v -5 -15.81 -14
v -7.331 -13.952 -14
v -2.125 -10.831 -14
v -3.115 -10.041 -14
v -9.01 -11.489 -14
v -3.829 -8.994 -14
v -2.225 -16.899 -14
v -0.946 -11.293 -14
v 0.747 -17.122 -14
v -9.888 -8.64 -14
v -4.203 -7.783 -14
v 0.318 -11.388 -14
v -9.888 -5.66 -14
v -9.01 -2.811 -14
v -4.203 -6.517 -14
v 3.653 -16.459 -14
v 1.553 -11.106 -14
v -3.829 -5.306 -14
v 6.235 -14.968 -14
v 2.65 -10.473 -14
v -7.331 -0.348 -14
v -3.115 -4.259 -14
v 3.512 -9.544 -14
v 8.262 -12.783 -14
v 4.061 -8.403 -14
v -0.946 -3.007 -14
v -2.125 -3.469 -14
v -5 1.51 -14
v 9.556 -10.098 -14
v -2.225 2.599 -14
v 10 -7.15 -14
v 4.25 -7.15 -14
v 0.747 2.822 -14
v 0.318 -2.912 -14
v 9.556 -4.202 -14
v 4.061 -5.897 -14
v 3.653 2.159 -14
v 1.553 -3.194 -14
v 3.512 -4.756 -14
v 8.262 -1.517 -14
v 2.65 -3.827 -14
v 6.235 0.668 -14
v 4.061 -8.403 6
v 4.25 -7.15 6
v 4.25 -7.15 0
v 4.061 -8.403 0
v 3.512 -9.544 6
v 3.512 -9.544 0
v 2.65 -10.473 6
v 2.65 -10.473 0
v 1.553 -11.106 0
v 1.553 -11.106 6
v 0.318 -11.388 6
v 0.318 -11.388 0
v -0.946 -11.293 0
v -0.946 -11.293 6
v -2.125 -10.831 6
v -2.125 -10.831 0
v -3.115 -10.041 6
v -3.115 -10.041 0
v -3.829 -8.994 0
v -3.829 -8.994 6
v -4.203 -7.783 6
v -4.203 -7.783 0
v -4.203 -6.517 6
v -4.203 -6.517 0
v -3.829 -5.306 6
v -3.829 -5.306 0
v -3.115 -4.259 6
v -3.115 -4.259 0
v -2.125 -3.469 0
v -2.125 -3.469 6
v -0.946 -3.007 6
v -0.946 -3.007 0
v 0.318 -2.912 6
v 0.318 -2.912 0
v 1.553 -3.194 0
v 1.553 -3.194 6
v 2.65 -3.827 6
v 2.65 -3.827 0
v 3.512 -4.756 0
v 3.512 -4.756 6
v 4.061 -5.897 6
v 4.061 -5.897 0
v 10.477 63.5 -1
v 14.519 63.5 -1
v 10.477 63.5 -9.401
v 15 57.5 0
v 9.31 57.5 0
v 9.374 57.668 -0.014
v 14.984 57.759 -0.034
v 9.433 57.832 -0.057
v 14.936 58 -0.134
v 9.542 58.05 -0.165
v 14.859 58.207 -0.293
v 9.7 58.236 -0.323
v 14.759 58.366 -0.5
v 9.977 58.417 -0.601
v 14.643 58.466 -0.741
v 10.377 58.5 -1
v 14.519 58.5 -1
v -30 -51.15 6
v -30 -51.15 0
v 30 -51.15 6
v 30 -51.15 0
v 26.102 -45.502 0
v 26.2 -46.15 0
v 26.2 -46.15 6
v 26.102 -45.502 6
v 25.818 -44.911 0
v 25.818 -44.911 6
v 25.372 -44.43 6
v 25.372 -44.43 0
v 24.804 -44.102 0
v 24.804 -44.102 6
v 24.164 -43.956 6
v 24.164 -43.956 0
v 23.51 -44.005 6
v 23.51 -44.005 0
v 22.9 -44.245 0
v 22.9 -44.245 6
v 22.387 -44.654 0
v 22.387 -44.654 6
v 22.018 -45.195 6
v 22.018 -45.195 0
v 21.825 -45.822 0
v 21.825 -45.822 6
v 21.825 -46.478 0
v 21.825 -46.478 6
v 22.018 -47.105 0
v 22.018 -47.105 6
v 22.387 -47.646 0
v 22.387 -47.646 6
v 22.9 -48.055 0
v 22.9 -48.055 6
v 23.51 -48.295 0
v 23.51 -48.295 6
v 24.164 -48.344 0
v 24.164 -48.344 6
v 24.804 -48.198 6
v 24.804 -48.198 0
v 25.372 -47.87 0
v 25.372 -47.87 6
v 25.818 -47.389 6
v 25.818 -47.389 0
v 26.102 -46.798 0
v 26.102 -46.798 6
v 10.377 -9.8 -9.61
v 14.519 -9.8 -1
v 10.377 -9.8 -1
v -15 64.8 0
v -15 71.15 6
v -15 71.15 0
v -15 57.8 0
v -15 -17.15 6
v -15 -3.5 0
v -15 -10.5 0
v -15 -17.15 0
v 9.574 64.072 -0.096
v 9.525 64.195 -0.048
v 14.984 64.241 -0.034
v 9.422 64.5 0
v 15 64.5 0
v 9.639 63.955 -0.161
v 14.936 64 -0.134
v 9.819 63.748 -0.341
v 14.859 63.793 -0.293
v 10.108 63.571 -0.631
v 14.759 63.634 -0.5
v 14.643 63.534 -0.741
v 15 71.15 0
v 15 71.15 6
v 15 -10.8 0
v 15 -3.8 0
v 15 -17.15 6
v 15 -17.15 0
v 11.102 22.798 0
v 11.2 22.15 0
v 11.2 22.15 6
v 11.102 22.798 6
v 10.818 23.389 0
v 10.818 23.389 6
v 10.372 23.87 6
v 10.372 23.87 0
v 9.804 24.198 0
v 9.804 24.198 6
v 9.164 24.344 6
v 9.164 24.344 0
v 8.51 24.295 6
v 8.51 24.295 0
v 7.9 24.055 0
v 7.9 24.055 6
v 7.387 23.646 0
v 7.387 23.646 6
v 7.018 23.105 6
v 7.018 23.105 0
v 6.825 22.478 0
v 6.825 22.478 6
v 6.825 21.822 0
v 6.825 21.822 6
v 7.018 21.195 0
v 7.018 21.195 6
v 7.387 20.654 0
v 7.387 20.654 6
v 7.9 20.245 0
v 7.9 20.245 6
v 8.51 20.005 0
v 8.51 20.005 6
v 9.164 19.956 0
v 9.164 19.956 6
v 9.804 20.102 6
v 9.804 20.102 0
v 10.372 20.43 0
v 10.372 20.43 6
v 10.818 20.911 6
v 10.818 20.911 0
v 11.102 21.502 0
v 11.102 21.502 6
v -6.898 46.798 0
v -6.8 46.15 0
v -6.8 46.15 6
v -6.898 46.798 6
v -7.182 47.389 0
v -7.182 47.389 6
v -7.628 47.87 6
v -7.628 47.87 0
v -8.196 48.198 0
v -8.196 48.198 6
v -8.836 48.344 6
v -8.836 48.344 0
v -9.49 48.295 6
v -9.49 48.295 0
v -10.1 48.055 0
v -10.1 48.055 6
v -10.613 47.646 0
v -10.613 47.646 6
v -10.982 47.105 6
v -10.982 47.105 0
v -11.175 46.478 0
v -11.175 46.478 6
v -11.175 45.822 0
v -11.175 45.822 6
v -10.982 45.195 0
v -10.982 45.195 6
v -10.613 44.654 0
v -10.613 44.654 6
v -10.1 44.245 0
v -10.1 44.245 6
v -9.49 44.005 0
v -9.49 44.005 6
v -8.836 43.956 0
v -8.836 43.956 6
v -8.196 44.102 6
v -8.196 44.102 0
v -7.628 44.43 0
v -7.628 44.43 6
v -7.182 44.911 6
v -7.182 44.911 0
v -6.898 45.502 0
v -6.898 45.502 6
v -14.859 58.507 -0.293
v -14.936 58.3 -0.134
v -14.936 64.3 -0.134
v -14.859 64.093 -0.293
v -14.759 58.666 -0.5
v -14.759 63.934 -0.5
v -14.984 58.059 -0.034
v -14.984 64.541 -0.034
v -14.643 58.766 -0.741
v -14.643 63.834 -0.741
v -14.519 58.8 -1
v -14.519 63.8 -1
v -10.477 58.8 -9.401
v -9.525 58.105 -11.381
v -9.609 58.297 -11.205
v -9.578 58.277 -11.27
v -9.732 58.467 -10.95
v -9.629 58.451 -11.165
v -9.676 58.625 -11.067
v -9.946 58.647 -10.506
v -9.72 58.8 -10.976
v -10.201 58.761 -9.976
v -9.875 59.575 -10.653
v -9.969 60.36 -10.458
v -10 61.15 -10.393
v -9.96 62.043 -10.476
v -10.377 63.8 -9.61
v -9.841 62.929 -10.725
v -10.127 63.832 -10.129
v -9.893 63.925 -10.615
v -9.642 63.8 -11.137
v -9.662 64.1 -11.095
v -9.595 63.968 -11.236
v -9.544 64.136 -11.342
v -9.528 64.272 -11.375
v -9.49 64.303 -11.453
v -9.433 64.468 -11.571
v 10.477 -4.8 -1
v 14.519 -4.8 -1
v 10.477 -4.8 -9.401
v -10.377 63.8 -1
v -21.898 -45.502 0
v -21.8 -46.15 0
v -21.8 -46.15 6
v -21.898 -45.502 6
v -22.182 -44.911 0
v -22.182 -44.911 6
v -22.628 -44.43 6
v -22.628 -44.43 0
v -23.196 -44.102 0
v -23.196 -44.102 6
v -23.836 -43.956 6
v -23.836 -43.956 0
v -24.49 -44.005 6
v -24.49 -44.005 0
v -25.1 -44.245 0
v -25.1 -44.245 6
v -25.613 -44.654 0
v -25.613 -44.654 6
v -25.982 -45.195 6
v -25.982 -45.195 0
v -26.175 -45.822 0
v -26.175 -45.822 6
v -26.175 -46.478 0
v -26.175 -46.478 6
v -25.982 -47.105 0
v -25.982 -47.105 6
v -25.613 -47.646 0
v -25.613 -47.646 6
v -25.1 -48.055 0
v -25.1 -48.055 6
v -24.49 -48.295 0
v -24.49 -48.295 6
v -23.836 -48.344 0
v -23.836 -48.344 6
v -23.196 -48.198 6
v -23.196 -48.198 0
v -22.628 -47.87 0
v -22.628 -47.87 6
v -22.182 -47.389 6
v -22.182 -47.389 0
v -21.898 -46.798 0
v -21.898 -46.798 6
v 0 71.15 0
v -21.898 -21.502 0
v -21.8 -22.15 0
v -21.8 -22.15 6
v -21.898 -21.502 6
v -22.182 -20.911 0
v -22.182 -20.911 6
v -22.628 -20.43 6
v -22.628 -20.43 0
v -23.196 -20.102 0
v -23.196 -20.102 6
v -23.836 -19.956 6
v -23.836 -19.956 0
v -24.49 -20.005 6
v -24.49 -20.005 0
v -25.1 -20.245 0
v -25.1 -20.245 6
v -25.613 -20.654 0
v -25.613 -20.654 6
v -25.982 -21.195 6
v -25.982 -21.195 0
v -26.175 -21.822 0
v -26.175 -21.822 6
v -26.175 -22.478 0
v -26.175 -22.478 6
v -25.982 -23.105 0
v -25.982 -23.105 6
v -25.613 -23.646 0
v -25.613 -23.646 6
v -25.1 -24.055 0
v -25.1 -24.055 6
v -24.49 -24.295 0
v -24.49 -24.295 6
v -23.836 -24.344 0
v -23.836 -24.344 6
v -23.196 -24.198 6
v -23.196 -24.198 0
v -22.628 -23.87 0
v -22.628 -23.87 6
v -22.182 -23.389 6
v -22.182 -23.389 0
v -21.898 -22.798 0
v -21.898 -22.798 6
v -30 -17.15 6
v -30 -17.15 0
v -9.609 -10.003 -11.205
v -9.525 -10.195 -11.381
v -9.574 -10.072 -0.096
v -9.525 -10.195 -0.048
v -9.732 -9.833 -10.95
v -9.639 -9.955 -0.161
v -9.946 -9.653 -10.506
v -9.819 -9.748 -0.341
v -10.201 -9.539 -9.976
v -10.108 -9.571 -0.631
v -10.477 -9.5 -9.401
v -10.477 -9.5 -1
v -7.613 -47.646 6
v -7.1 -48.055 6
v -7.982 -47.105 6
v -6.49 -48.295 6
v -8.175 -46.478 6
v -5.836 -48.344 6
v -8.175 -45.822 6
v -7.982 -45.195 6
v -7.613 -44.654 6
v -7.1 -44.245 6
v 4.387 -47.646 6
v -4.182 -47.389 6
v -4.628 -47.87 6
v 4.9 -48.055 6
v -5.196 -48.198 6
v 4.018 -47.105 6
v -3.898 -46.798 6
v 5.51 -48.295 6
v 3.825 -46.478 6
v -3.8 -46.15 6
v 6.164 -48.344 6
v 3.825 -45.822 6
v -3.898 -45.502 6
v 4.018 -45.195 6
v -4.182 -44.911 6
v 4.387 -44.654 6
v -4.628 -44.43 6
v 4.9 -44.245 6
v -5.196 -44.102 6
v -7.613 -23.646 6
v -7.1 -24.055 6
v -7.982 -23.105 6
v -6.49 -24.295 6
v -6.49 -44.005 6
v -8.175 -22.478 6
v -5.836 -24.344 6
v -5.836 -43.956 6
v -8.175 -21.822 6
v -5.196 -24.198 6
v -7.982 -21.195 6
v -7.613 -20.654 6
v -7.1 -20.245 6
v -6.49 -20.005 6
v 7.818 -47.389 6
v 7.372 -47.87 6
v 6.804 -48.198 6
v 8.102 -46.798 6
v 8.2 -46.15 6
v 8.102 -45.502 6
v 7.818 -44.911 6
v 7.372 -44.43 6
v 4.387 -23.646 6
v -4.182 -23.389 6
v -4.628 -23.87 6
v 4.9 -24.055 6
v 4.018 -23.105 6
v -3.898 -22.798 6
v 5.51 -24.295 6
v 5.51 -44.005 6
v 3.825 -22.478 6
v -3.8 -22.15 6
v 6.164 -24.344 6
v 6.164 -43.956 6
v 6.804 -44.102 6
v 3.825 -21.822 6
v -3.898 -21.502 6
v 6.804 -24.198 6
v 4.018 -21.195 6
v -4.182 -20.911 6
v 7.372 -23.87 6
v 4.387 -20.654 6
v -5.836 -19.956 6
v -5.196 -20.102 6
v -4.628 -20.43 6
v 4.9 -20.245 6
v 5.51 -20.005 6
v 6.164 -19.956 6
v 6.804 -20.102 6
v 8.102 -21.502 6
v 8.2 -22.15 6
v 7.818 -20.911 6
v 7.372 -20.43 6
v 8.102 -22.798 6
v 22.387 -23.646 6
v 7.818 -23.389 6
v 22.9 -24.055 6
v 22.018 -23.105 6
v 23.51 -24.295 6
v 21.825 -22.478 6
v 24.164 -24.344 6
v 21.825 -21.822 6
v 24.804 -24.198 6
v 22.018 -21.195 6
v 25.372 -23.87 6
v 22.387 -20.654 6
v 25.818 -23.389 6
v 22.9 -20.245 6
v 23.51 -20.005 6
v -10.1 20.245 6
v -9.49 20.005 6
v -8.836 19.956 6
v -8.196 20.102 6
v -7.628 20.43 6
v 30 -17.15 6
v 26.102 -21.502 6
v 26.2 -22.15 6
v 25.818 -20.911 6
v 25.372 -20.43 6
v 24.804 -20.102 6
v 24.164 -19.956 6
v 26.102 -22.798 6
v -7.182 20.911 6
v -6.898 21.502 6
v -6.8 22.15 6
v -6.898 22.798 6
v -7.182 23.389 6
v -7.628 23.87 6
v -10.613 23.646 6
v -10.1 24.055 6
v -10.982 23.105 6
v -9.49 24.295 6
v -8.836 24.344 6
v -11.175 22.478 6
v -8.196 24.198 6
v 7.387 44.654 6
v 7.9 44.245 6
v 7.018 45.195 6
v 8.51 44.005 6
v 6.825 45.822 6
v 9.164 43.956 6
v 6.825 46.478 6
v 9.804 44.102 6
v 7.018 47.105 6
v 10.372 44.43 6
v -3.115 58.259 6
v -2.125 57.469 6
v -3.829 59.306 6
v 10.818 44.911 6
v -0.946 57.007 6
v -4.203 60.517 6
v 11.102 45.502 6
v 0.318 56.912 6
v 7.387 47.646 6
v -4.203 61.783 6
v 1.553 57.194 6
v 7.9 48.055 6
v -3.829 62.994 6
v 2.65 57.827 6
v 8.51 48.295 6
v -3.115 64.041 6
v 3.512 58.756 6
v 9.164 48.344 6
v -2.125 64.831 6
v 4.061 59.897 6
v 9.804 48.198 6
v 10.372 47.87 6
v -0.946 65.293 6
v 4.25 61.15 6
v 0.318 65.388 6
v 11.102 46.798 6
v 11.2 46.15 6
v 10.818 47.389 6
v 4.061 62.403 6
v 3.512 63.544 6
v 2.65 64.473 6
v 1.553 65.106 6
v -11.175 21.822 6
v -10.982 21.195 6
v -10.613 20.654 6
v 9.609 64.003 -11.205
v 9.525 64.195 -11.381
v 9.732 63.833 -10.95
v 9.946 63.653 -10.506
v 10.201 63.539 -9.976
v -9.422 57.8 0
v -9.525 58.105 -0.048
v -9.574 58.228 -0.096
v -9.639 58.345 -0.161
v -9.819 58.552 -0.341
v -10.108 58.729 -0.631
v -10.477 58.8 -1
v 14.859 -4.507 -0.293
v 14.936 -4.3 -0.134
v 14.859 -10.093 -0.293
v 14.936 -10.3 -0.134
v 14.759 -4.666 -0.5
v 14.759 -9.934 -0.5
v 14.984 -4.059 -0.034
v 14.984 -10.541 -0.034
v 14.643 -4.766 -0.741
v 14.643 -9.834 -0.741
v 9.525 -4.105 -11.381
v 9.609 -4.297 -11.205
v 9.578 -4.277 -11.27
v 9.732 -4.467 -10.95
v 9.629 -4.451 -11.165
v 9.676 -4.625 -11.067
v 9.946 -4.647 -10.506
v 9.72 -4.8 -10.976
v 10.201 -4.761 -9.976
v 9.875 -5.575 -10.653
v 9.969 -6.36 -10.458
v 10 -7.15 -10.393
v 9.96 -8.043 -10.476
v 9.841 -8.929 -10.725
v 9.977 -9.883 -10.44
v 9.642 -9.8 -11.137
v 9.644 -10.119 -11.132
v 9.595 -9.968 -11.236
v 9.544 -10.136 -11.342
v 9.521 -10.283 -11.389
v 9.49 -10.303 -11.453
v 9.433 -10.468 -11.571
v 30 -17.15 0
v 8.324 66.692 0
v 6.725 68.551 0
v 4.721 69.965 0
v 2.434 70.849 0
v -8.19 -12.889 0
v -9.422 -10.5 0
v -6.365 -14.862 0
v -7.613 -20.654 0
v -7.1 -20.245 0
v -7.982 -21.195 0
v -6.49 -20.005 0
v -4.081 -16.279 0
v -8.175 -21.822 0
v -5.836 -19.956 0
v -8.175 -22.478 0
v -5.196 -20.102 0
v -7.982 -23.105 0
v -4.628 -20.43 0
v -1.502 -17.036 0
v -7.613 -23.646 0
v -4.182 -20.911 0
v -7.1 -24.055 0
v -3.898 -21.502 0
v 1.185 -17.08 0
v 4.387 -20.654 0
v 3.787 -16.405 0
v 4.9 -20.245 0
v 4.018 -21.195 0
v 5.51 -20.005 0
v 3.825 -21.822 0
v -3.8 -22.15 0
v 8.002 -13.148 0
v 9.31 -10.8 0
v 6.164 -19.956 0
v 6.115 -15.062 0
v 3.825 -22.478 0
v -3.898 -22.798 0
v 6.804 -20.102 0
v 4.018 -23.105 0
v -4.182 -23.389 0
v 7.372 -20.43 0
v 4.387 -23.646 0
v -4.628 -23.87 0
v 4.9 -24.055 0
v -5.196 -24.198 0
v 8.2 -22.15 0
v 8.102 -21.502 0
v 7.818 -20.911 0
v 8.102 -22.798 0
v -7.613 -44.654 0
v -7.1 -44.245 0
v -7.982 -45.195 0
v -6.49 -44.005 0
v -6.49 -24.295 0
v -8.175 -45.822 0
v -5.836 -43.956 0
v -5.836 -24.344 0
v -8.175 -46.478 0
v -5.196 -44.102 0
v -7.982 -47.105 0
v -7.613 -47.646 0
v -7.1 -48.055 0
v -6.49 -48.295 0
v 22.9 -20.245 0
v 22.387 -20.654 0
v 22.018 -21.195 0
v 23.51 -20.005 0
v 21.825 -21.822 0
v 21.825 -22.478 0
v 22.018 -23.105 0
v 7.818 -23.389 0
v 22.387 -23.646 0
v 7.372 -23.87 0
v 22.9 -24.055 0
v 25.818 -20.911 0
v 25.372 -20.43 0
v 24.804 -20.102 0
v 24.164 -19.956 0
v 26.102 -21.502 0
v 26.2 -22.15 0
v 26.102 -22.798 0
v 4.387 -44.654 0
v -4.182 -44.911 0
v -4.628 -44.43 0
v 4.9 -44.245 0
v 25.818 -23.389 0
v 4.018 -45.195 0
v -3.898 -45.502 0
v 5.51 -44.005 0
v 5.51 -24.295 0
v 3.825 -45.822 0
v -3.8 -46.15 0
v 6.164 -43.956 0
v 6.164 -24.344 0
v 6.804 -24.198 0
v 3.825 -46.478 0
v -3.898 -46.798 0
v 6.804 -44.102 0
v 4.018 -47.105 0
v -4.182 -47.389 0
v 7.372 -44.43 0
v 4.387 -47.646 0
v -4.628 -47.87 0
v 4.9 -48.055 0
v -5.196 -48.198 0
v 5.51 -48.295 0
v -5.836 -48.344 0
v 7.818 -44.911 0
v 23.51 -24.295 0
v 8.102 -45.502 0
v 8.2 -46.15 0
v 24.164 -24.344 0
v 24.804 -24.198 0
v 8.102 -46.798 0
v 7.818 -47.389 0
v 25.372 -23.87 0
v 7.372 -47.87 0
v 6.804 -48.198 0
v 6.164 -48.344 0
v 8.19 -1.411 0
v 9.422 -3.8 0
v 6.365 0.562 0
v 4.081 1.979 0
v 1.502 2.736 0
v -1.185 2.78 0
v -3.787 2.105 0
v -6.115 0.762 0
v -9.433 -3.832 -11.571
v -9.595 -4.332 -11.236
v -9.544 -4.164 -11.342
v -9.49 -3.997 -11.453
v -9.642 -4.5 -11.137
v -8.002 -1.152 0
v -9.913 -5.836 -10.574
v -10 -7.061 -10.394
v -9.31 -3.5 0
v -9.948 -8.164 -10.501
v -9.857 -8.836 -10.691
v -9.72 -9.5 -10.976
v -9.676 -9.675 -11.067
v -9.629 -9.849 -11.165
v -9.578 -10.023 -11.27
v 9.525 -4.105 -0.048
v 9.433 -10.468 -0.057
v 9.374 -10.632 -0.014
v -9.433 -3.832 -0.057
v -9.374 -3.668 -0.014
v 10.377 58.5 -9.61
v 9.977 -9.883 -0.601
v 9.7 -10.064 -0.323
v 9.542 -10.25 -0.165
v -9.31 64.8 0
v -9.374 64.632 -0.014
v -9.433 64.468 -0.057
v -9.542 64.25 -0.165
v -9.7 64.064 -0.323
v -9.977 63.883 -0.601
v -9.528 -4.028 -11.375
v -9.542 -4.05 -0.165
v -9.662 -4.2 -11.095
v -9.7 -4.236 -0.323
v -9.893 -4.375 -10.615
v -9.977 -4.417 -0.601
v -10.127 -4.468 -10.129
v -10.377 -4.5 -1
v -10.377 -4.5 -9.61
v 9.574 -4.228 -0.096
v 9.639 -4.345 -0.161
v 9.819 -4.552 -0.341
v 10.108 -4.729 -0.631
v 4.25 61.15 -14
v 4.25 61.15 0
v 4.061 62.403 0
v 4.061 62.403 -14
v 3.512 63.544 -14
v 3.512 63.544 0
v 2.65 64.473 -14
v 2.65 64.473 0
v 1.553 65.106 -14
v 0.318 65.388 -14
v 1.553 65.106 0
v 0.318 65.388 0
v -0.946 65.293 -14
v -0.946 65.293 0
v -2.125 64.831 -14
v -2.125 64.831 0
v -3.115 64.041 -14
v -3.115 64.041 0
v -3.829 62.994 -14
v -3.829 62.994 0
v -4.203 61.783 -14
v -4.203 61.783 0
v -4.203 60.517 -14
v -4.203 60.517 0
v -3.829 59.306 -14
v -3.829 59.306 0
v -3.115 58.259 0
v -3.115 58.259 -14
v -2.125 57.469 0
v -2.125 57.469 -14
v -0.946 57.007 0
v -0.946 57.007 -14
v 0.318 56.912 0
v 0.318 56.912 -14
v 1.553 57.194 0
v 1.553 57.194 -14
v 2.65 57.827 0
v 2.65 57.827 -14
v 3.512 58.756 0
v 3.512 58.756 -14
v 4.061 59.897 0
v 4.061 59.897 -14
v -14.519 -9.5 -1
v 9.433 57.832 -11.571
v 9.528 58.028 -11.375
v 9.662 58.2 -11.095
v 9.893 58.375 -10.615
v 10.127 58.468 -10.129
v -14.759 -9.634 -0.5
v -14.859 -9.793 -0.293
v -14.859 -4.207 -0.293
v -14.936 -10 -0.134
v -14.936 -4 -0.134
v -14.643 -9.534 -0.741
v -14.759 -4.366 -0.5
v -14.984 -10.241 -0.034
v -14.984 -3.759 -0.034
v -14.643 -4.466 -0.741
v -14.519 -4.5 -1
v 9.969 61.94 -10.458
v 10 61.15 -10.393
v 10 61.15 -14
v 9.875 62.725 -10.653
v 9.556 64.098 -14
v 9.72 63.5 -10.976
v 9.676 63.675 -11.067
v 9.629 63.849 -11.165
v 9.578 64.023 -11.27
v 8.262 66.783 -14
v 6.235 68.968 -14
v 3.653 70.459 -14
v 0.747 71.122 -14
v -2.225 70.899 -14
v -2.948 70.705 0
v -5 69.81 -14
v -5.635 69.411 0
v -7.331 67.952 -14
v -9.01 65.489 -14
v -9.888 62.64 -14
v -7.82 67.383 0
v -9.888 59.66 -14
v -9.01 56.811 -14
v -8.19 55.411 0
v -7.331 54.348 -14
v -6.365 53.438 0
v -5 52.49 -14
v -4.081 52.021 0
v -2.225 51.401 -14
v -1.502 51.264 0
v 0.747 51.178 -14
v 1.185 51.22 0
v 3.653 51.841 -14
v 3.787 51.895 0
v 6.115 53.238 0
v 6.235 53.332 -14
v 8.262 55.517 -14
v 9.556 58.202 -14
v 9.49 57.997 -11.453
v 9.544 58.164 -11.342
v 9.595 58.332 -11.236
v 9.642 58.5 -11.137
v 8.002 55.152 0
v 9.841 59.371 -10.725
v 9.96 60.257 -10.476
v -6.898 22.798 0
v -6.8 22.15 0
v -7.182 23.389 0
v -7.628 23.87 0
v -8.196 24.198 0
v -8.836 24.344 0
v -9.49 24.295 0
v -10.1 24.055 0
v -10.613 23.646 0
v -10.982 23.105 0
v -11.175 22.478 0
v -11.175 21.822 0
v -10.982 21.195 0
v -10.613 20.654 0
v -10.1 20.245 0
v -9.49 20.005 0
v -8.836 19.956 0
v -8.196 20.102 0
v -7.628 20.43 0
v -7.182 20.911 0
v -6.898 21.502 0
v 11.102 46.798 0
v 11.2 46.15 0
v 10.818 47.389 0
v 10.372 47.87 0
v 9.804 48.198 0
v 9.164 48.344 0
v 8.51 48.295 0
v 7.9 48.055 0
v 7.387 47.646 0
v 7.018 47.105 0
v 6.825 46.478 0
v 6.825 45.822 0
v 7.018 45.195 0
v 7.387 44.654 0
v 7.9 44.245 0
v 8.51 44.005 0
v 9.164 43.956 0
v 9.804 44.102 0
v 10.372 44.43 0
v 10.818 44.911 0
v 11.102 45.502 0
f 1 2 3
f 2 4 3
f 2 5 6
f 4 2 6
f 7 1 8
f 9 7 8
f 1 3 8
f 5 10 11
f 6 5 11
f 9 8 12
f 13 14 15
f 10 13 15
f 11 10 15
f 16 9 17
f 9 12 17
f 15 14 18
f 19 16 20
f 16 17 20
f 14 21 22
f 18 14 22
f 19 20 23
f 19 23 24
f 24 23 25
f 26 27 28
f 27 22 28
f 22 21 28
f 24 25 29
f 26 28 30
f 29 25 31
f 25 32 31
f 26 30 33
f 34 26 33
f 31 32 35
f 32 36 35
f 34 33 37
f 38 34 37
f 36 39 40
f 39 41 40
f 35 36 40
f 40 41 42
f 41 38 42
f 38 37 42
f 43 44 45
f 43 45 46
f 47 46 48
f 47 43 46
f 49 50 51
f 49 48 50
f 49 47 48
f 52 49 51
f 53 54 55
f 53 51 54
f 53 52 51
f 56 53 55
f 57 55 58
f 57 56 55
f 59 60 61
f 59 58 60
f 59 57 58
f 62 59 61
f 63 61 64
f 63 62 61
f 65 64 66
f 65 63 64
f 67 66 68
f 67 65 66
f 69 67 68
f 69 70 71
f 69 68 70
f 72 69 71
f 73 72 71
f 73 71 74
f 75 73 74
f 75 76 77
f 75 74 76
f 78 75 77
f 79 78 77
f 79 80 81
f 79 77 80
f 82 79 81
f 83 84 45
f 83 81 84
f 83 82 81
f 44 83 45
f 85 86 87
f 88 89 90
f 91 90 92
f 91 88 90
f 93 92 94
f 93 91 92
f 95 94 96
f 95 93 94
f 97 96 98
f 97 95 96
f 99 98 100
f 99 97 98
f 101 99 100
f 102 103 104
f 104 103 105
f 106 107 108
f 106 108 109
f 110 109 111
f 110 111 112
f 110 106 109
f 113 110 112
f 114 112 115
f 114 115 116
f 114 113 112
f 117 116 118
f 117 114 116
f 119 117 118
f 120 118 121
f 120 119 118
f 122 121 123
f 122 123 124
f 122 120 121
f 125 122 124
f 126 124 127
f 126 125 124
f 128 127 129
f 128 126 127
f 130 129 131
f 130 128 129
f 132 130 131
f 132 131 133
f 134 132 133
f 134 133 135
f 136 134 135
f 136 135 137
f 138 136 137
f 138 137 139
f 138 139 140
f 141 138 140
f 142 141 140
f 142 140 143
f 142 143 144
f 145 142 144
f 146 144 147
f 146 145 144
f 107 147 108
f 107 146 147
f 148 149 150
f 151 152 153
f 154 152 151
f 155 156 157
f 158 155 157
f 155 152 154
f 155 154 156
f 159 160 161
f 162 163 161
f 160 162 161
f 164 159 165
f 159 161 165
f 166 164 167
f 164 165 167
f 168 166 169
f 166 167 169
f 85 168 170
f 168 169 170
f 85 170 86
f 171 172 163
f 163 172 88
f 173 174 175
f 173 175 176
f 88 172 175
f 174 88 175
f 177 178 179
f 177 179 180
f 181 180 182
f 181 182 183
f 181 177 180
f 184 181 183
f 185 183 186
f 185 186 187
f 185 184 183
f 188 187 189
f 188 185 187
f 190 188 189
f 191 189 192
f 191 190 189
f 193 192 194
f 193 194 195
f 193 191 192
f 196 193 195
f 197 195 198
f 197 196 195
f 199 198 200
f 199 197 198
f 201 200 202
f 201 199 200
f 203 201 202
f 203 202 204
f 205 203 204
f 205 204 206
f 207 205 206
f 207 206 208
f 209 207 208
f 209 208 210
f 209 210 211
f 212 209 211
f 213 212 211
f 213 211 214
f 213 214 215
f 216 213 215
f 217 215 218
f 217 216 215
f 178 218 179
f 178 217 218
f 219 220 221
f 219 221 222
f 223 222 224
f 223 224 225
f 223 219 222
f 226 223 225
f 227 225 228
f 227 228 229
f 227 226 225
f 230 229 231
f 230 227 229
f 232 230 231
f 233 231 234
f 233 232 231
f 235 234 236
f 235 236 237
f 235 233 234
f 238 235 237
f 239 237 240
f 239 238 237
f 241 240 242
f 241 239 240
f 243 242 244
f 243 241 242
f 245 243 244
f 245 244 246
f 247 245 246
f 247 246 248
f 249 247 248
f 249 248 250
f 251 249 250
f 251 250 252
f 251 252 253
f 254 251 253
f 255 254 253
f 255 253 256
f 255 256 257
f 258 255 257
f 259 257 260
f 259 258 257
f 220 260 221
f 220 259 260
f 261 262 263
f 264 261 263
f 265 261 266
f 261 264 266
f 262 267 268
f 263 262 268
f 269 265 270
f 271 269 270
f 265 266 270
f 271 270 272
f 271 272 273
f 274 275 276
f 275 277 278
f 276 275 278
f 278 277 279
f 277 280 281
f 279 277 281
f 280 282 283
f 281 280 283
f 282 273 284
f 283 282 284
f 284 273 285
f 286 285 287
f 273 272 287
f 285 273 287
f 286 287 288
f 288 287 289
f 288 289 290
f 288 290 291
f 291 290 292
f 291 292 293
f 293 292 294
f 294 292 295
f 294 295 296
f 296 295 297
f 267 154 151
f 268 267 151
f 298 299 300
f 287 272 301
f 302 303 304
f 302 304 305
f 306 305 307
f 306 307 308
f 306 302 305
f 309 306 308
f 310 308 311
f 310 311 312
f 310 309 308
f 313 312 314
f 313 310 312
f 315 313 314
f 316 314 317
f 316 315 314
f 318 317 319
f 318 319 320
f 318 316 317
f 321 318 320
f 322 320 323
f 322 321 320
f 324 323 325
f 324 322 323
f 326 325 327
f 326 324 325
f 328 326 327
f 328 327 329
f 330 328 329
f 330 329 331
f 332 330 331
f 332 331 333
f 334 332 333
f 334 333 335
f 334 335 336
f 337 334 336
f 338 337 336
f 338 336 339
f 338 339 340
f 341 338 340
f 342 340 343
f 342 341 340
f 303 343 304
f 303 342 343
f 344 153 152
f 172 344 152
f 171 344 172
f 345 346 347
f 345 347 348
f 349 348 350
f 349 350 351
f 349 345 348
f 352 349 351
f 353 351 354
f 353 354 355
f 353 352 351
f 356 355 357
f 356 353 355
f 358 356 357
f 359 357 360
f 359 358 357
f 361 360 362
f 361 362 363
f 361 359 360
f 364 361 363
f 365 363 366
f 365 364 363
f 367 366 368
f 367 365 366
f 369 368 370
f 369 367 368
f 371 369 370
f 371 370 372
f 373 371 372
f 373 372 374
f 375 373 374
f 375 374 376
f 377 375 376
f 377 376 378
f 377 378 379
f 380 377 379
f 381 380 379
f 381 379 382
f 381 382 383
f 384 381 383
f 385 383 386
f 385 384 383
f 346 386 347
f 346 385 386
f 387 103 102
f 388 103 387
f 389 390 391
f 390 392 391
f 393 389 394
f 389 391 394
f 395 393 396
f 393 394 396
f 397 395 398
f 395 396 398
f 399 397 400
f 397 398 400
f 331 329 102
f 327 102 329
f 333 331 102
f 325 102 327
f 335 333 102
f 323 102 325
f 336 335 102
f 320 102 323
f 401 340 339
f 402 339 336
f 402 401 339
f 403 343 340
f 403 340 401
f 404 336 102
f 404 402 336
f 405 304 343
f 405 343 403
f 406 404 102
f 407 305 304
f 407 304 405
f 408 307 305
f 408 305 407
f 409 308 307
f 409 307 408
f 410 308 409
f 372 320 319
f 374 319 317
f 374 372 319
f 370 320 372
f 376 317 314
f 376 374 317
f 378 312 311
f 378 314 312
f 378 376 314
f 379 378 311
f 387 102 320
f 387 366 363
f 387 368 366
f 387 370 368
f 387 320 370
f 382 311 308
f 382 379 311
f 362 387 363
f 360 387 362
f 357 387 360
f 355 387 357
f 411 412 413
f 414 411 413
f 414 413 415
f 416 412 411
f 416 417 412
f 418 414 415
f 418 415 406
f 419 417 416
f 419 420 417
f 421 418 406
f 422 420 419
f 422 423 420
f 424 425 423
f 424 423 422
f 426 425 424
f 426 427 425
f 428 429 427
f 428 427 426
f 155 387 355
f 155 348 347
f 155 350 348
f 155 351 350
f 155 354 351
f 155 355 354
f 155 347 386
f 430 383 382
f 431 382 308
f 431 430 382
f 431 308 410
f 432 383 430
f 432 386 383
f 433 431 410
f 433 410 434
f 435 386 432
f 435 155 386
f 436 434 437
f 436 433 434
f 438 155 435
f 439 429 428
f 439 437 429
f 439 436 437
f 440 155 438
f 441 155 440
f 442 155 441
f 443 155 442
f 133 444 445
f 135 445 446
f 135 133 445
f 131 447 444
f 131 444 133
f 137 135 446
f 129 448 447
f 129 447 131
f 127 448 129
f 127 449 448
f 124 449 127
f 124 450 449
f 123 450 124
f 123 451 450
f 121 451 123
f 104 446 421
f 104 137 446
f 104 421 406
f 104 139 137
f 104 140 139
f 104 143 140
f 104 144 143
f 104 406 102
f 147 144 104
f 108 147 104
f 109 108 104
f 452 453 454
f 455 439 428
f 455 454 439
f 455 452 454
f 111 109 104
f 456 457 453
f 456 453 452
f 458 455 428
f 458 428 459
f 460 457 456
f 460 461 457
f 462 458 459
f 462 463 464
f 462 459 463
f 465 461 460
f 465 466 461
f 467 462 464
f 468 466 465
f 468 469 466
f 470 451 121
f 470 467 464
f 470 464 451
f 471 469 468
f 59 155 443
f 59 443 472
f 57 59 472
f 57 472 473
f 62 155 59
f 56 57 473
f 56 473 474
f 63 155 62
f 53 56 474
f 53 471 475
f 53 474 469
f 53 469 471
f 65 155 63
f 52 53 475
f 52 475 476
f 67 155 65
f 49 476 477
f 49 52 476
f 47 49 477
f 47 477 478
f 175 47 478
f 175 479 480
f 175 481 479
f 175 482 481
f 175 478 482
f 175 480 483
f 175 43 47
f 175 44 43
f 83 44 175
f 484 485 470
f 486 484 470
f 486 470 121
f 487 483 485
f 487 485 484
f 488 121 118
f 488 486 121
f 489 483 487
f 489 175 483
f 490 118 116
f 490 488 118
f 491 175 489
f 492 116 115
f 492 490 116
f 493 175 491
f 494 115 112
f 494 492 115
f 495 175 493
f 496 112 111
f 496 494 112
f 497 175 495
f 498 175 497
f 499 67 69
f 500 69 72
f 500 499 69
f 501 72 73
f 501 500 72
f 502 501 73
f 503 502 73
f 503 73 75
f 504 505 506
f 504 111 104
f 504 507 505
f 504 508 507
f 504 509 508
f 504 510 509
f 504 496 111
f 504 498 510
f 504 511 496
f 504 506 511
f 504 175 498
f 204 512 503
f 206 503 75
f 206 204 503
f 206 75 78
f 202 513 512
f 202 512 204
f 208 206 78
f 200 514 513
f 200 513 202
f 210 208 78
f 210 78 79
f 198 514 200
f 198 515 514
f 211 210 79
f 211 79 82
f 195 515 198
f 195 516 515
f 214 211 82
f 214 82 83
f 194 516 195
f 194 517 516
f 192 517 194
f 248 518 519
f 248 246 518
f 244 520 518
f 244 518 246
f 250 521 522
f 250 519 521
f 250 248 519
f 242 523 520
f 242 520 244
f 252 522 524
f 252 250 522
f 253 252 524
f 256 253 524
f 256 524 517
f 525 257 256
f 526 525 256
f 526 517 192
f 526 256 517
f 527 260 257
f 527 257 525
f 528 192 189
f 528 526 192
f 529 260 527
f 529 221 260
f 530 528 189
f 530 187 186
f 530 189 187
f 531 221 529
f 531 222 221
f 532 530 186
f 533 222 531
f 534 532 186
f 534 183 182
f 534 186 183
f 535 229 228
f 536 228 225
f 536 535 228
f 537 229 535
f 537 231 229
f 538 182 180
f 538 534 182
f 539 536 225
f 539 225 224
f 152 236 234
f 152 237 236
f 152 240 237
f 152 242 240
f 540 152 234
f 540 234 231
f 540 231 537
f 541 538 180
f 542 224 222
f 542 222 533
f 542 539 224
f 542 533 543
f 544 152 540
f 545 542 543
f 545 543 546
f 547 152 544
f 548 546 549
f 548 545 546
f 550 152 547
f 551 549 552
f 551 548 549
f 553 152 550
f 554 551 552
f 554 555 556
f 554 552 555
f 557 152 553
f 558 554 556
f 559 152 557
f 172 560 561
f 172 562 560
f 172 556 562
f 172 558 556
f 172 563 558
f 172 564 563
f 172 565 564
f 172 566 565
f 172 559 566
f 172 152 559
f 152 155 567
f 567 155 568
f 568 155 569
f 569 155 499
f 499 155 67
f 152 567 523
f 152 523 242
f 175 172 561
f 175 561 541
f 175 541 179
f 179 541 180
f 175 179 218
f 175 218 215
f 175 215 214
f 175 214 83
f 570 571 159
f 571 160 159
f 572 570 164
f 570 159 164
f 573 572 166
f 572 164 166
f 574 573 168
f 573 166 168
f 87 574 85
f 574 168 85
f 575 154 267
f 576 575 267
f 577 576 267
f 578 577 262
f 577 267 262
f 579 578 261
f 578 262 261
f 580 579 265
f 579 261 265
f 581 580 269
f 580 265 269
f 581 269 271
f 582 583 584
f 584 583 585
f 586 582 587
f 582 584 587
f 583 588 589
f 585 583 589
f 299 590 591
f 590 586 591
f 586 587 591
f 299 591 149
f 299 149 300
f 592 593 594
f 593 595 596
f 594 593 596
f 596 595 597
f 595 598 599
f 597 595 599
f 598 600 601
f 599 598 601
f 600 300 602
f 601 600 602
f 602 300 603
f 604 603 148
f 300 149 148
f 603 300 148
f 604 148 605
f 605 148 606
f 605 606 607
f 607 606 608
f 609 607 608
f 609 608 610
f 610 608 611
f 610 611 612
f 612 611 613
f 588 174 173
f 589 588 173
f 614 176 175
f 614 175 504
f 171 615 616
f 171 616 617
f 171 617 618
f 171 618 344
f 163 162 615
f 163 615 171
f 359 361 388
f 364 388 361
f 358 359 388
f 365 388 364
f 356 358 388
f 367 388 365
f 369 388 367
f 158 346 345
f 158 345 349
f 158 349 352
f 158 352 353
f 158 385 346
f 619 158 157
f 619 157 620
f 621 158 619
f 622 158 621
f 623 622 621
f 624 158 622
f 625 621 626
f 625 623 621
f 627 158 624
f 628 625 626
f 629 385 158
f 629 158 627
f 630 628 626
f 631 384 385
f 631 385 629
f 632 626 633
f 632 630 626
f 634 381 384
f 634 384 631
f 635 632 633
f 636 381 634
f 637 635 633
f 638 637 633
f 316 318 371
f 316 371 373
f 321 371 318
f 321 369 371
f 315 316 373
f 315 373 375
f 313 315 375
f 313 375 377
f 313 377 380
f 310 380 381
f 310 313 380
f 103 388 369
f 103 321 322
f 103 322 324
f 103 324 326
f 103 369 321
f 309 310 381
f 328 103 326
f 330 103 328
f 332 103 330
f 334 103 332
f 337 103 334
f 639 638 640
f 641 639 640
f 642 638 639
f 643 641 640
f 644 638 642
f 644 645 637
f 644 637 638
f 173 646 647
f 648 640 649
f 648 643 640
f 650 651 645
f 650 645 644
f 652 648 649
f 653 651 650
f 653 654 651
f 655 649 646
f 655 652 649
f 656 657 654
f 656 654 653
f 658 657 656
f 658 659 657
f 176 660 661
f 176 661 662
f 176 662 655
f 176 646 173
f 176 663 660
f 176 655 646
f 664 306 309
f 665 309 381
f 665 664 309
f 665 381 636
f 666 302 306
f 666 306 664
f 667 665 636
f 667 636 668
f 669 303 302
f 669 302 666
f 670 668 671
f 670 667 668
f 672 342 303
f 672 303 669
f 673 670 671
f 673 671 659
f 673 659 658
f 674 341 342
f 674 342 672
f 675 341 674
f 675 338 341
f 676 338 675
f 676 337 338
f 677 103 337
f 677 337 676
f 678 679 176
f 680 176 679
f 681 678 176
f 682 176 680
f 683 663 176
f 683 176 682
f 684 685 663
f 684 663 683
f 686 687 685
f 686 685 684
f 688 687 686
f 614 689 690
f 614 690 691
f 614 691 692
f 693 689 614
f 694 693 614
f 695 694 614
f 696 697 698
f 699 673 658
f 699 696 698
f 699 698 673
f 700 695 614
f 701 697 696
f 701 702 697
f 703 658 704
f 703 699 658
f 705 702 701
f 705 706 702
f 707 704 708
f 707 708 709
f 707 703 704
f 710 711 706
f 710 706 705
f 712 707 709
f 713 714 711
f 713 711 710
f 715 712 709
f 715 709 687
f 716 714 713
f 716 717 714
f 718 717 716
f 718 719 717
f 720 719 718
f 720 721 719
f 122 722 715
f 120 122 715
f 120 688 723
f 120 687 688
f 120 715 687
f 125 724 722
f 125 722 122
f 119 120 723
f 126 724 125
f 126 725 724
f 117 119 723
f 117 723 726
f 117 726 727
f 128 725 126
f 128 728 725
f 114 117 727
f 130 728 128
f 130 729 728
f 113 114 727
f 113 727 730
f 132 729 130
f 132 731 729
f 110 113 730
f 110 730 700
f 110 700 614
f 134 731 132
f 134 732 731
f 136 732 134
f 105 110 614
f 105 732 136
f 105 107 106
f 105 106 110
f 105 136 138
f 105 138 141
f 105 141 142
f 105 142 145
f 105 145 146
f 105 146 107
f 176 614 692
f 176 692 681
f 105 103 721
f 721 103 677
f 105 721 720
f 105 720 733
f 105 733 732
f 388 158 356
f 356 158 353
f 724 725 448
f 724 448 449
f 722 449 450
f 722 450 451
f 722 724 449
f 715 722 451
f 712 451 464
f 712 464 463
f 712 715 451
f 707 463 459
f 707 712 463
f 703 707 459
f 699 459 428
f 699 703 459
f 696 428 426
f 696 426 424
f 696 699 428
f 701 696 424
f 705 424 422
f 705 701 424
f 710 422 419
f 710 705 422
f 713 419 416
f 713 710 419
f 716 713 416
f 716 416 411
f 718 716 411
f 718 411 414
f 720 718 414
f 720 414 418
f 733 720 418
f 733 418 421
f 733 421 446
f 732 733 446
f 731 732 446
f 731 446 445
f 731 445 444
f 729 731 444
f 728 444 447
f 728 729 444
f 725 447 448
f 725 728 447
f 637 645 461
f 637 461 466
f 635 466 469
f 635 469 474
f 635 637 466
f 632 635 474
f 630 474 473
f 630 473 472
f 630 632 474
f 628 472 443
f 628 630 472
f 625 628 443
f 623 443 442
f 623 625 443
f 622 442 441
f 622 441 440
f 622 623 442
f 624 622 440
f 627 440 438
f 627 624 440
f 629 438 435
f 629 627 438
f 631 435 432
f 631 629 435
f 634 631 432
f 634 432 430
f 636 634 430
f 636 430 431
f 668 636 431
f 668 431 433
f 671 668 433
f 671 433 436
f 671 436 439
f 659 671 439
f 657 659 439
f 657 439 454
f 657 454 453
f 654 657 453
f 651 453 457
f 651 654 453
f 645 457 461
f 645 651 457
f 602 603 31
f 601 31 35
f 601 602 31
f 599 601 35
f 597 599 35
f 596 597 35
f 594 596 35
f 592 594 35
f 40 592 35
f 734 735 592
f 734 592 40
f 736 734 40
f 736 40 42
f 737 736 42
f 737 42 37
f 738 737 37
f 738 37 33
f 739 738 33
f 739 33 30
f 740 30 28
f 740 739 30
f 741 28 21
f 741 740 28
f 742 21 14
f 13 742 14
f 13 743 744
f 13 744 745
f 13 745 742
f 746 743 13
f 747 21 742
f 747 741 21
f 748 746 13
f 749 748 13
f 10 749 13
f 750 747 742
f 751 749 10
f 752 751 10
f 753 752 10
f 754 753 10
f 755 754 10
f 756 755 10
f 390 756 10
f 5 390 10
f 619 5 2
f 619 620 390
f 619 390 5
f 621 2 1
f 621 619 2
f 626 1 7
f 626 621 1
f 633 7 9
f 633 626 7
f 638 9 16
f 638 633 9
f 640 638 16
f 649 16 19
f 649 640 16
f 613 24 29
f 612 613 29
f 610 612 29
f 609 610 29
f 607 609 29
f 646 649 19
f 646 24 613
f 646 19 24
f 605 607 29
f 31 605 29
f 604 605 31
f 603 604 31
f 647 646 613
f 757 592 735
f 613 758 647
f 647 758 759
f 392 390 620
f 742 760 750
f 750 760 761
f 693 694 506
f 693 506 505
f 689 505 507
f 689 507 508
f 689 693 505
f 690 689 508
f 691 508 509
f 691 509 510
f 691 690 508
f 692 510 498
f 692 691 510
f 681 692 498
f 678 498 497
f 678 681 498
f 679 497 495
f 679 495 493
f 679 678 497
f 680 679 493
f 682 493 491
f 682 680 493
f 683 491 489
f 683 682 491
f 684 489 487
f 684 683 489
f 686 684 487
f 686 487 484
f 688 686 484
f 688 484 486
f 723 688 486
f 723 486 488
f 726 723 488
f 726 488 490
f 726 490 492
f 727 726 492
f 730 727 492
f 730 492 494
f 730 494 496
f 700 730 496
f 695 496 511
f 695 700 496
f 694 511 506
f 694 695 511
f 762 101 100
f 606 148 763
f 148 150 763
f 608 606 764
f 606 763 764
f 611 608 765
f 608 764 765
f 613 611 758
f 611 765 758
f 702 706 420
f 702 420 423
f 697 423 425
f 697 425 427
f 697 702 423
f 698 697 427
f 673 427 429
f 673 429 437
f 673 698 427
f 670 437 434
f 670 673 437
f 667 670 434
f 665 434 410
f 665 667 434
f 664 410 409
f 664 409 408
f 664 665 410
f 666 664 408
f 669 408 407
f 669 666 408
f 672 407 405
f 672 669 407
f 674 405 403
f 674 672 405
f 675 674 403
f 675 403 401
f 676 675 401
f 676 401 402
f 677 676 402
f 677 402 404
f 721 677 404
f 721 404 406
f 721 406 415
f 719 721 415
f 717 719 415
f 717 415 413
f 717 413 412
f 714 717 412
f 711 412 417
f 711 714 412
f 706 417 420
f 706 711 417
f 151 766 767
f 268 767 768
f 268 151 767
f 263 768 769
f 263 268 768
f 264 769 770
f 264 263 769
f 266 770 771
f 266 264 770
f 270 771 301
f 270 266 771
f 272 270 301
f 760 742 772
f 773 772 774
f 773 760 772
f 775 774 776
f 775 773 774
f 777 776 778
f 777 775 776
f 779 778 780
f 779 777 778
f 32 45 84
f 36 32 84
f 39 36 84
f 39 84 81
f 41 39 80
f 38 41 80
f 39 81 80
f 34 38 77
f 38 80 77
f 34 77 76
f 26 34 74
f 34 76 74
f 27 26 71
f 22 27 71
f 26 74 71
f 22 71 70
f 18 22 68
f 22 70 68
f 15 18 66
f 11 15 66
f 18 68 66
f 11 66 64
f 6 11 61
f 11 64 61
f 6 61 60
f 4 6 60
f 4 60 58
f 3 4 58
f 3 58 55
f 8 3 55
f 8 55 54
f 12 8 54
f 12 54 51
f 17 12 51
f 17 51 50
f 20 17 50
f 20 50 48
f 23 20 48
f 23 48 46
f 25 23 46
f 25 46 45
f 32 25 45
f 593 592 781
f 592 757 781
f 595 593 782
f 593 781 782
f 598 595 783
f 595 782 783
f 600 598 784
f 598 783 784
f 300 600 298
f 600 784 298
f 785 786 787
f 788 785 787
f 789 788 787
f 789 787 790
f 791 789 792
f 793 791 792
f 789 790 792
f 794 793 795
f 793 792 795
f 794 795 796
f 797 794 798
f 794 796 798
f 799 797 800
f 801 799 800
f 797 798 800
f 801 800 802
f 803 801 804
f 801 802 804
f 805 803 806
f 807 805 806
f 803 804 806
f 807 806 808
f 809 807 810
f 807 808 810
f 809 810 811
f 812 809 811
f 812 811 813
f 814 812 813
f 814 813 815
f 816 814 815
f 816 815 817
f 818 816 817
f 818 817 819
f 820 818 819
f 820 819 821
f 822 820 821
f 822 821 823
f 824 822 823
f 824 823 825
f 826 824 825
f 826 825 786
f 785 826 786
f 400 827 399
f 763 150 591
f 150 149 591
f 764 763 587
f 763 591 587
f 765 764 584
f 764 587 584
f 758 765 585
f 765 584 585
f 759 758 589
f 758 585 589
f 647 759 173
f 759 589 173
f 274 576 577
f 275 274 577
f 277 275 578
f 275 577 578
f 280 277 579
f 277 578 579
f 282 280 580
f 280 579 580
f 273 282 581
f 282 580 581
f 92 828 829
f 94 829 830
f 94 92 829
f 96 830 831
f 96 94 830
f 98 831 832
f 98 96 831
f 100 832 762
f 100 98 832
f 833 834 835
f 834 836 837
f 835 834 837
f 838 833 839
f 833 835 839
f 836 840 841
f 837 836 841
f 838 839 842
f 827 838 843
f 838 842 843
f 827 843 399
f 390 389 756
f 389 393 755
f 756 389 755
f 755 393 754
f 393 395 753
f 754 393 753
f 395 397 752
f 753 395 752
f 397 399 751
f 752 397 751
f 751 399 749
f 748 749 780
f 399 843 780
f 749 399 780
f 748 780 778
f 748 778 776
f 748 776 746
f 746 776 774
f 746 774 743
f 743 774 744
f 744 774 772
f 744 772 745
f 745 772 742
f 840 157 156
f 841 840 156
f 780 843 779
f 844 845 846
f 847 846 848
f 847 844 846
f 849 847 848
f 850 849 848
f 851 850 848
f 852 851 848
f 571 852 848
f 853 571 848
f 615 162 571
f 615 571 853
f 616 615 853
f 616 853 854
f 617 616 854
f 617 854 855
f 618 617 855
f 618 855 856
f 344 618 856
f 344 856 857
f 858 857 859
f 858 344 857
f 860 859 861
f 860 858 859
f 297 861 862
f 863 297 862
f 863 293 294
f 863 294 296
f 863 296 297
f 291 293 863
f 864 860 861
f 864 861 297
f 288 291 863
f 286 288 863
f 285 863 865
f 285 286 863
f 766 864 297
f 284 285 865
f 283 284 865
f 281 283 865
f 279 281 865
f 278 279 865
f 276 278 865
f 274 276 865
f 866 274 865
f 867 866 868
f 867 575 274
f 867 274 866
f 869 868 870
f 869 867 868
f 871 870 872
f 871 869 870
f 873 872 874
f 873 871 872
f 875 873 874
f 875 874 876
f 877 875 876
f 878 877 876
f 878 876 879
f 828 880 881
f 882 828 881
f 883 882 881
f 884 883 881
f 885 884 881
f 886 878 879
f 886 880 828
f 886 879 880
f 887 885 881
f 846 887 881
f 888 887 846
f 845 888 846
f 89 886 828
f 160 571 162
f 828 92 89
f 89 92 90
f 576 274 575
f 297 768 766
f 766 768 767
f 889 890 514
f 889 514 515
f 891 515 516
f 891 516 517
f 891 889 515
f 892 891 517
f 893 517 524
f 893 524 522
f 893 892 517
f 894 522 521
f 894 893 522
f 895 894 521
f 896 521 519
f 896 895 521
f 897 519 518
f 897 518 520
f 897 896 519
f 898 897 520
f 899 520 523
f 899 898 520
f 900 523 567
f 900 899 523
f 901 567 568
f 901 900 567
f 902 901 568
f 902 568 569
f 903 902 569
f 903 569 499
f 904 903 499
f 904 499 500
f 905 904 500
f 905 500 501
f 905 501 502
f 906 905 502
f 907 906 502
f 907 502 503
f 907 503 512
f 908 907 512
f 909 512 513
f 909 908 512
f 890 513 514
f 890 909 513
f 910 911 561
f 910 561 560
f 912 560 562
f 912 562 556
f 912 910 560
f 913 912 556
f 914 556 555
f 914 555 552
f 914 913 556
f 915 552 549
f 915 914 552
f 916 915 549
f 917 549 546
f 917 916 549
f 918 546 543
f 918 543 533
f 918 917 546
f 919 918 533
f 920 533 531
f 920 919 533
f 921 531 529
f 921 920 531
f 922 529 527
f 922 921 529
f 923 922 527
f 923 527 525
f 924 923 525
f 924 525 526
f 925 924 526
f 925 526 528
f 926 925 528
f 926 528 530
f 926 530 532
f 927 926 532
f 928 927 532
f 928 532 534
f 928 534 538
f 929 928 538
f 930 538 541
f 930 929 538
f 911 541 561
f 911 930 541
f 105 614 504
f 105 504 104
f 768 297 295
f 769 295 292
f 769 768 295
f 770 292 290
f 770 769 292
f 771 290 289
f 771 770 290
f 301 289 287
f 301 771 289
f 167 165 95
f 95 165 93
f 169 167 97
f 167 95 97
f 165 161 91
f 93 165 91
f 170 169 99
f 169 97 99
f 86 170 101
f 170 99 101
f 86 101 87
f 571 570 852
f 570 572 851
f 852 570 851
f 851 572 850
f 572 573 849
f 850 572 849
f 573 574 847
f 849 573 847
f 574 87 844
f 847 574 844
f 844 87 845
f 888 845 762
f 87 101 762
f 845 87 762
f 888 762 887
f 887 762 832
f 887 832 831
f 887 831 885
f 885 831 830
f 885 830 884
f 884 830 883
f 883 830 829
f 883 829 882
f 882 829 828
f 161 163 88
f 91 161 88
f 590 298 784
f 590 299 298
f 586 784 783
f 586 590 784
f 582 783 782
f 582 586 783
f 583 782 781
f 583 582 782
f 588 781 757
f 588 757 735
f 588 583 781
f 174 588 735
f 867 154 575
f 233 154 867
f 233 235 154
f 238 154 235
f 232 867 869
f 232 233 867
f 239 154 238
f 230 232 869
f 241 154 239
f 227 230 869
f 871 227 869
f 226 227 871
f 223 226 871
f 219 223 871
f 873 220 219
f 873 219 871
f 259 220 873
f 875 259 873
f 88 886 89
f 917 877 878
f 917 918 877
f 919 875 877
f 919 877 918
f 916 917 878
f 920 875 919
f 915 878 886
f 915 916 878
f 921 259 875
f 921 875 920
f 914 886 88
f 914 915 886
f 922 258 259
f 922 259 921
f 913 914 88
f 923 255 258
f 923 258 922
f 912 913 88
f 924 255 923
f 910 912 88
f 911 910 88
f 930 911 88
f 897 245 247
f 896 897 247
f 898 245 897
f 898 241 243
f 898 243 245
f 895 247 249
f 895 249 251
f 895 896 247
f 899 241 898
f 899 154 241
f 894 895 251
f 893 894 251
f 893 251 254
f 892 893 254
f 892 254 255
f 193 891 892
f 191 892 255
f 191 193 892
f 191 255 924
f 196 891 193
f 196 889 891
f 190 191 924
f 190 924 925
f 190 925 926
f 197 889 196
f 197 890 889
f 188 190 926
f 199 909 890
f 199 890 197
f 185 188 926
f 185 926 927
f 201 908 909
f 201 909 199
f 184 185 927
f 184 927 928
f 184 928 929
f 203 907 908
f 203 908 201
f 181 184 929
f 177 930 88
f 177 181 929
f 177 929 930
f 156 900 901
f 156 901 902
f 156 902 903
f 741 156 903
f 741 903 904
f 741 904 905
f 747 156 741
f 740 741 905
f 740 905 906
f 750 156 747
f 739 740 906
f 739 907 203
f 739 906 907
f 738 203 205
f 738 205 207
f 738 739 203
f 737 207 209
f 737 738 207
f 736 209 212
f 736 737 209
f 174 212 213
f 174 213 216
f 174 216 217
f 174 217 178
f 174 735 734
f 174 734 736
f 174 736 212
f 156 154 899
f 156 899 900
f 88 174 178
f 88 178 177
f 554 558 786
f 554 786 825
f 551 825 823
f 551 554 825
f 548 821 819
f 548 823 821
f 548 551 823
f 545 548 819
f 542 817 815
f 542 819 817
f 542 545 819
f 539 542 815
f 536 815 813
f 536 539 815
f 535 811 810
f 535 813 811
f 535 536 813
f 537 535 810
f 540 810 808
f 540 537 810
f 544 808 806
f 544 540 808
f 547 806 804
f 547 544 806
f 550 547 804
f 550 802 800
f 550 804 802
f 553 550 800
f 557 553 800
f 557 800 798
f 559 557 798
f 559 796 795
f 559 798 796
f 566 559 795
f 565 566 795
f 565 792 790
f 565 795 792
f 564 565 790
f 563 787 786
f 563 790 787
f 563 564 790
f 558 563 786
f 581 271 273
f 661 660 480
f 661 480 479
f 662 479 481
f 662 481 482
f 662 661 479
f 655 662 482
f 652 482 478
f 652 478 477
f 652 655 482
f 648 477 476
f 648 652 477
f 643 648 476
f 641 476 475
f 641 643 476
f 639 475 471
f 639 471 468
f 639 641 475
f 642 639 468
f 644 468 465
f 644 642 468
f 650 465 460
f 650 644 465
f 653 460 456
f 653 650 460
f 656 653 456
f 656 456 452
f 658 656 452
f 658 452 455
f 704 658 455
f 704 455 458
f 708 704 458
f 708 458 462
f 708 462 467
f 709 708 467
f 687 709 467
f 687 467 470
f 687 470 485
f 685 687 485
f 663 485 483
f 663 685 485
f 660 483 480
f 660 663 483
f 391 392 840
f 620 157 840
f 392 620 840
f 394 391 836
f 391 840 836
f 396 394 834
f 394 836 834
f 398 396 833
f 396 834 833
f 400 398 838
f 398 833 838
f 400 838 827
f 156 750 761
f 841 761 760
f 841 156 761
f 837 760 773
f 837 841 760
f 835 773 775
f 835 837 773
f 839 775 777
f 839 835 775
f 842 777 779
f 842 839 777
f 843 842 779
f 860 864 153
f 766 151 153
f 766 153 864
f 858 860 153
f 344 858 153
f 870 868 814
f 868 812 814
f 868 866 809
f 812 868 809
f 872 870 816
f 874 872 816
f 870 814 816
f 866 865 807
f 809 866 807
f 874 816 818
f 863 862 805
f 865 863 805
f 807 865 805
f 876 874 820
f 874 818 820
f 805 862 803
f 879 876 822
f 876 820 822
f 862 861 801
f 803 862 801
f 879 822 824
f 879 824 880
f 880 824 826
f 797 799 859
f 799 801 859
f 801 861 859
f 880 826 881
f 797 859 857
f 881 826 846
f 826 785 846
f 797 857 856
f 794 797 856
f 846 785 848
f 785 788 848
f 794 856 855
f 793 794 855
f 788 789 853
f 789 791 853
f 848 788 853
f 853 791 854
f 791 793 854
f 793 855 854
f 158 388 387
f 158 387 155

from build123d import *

# Parameters (mm, degrees)
SKETCH1_R                 = 2.2
BOSS_EXTRUDE1_DEPTH       = 6
SKETCH4_W                 = 30
SKETCH4_H                 = 6
BOSS_EXTRUDE3_DEPTH       = 20
SKETCH5_R                 = 10
SKETCH5_R_2               = 4.25
BOSS_EXTRUDE4_DEPTH       = 20
CUT_EXTRUDE1_START        = -20
SKETCH7_R                 = 4.25
CUT_EXTRUDE1_DEPTH        = 20
RIB1_REACH                = 118.934
SKETCH8_WALL_W            = 247.402128672
SKETCH8_WALL_H            = 5
CIRPATTERN2_COUNT         = 2
CIRPATTERN2_ANGLE         = 180
LPATTERN3_COUNT           = 2
LPATTERN3_PITCH           = 68.3
LPATTERN3_COPY_1_REACH    = 118.934
LPATTERN3_COPY_1_SKETCH_W = 247.402128672
LPATTERN3_COPY_1_SKETCH_H = 5
FILLET4_R                 = 1
CUT_EXTRUDE2_START        = -20
SKETCH9_R                 = 4.25
CUT_EXTRUDE2_DEPTH        = 20


with BuildPart() as part:
    # Sketch1 → Boss-Extrude1 (new body)
    with BuildSketch(Plane.XY):
        Polygon((-15, 51.15), (15, 51.15), (15, -17.15), (30, -17.15), (30, -51.15), (15, -51.15), (-15, -51.15), (-30, -51.15), (-30, -17.15), (-15, -17.15), align=None)
        with Locations((9, 46.15)):
            Circle(SKETCH1_R, mode=Mode.SUBTRACT)
        with Locations((-9, 46.15)):
            Circle(SKETCH1_R, mode=Mode.SUBTRACT)
        with Locations((-9, 22.15)):
            Circle(SKETCH1_R, mode=Mode.SUBTRACT)
        with Locations((9, 22.15)):
            Circle(SKETCH1_R, mode=Mode.SUBTRACT)
        with Locations((-6, -22.15)):
            Circle(SKETCH1_R, mode=Mode.SUBTRACT)
        with Locations((-24, -22.15)):
            Circle(SKETCH1_R, mode=Mode.SUBTRACT)
        with Locations((-24, -46.15)):
            Circle(SKETCH1_R, mode=Mode.SUBTRACT)
        with Locations((-6, -46.15)):
            Circle(SKETCH1_R, mode=Mode.SUBTRACT)
        with Locations((6, -22.15)):
            Circle(SKETCH1_R, mode=Mode.SUBTRACT)
        with Locations((24, -22.15)):
            Circle(SKETCH1_R, mode=Mode.SUBTRACT)
        with Locations((6, -46.15)):
            Circle(SKETCH1_R, mode=Mode.SUBTRACT)
        with Locations((24, -46.15)):
            Circle(SKETCH1_R, mode=Mode.SUBTRACT)
    extrude(amount=BOSS_EXTRUDE1_DEPTH)

    # Sketch4 → Boss-Extrude3 (add)
    with BuildSketch(Plane(origin=(0, 51.15, 0), x_dir=(1, 0, 0), z_dir=(0, 1, 0))):
        with Locations((0, -3)):
            Rectangle(SKETCH4_W, SKETCH4_H)
    extrude(amount=BOSS_EXTRUDE3_DEPTH)

    # Sketch5 → Boss-Extrude4 (add)
    with BuildSketch(Plane.XY.offset(6)):
        with Locations((0, 61.15)):
            Circle(SKETCH5_R)
        with Locations((0, 61.15)):
            Circle(SKETCH5_R_2, mode=Mode.SUBTRACT)
    boss_extrude4 = extrude(amount=-BOSS_EXTRUDE4_DEPTH)

    # Sketch7 → Cut-Extrude1 (cut)
    with BuildSketch(Plane(origin=(0, 0, 0), x_dir=(-1, 0, 0), z_dir=(0, 0, -1)).offset(CUT_EXTRUDE1_START)):
        with Locations(Location((0, 61.15, 0), (0, 0, 180))):
            Circle(SKETCH7_R)
    extrude(amount=CUT_EXTRUDE1_DEPTH, mode=Mode.SUBTRACT)

    # Sketch8 wall → Rib1 (add, up to next)
    with BuildSketch(Plane(origin=(12.5, 61, -5.196726493), x_dir=(-0.433516092302, 0, -0.901145824889), z_dir=(-0.901145824889, 0, 0.433516092302)), mode=Mode.PRIVATE) as rib1_sk1:
        Rectangle(SKETCH8_WALL_W, SKETCH8_WALL_H)
    rib1_tool1 = extrude(rib1_sk1.sketch, amount=RIB1_REACH, mode=Mode.PRIVATE) - part.part
    rib1 = rib1_tool1.solids().sort_by_distance((12.5, 61, -5.196726493))[0]
    add(rib1)

    # CirPattern2: Rib1 ×2 about axis
    cirpattern2_axis = Axis((0, 61.15, -14), (0, 0, 1))
    for i in range(1, CIRPATTERN2_COUNT):
        add(rib1.rotate(cirpattern2_axis, i * CIRPATTERN2_ANGLE / (CIRPATTERN2_COUNT - 1)))

    # LPattern3: Boss-Extrude4, Rib1 ×2
    with Locations(*[(0, -i * LPATTERN3_PITCH, 0) for i in range(1, LPATTERN3_COUNT)]):
        add(boss_extrude4)
        add(rib1)

    # LPattern3 copy 1 sketch → LPattern3 copy 1 (add, up to next)
    with BuildSketch(Plane(origin=(-12.5, -7, -5.196726493), x_dir=(0.433516092302, 3.0272266927212608e-15, -0.901145824889), z_dir=(0.901145824889, 6.292667662352691e-15, 0.433516092302)), mode=Mode.PRIVATE) as lpattern3_copy_1_sk1:
        Rectangle(LPATTERN3_COPY_1_SKETCH_W, LPATTERN3_COPY_1_SKETCH_H)
    lpattern3_copy_1_tool1 = extrude(lpattern3_copy_1_sk1.sketch, amount=LPATTERN3_COPY_1_REACH, mode=Mode.PRIVATE) - part.part
    add(lpattern3_copy_1_tool1.solids().sort_by_distance((-12.5, -7, -5.196726493))[0])

    # Fillet4
    fillet4_edges = [part.edges().sort_by_distance(p)[0] for p in [
        (12.359976852, 63.5, 0),
        (9.719953704, 63.5, -5.487791295),
        (9.64248412, 58.5, -5.568308943),
        (12.32124206, 58.5, 0),
        (-9.64248412, 63.8, -5.568308943),
        (-12.32124206, 63.8, 0),
        (-12.359976852, 58.8, 0),
        (-9.719953704, 58.8, -5.487791295),
        (12.359976852, -4.8, 0),
        (9.64248412, -9.8, -5.568308943),
        (9.719953704, -4.8, -5.487791295),
        (12.32124206, -9.8, 0),
        (-9.64248412, -4.5, -5.568308943),
        (-12.359976852, -9.5, 0),
        (-9.719953704, -9.5, -5.487791295),
        (-12.32124206, -4.5, 0),
    ]]
    fillet(fillet4_edges, radius=FILLET4_R)

    # Sketch9 → Cut-Extrude2 (cut)
    with BuildSketch(Plane(origin=(0, 0, 0), x_dir=(-1, 0, 0), z_dir=(0, 0, -1)).offset(CUT_EXTRUDE2_START)):
        with Locations(Location((0, -7.15, 0), (0, 0, 180))):
            Circle(SKETCH9_R)
    extrude(amount=CUT_EXTRUDE2_DEPTH, mode=Mode.SUBTRACT)


solid = part.part
